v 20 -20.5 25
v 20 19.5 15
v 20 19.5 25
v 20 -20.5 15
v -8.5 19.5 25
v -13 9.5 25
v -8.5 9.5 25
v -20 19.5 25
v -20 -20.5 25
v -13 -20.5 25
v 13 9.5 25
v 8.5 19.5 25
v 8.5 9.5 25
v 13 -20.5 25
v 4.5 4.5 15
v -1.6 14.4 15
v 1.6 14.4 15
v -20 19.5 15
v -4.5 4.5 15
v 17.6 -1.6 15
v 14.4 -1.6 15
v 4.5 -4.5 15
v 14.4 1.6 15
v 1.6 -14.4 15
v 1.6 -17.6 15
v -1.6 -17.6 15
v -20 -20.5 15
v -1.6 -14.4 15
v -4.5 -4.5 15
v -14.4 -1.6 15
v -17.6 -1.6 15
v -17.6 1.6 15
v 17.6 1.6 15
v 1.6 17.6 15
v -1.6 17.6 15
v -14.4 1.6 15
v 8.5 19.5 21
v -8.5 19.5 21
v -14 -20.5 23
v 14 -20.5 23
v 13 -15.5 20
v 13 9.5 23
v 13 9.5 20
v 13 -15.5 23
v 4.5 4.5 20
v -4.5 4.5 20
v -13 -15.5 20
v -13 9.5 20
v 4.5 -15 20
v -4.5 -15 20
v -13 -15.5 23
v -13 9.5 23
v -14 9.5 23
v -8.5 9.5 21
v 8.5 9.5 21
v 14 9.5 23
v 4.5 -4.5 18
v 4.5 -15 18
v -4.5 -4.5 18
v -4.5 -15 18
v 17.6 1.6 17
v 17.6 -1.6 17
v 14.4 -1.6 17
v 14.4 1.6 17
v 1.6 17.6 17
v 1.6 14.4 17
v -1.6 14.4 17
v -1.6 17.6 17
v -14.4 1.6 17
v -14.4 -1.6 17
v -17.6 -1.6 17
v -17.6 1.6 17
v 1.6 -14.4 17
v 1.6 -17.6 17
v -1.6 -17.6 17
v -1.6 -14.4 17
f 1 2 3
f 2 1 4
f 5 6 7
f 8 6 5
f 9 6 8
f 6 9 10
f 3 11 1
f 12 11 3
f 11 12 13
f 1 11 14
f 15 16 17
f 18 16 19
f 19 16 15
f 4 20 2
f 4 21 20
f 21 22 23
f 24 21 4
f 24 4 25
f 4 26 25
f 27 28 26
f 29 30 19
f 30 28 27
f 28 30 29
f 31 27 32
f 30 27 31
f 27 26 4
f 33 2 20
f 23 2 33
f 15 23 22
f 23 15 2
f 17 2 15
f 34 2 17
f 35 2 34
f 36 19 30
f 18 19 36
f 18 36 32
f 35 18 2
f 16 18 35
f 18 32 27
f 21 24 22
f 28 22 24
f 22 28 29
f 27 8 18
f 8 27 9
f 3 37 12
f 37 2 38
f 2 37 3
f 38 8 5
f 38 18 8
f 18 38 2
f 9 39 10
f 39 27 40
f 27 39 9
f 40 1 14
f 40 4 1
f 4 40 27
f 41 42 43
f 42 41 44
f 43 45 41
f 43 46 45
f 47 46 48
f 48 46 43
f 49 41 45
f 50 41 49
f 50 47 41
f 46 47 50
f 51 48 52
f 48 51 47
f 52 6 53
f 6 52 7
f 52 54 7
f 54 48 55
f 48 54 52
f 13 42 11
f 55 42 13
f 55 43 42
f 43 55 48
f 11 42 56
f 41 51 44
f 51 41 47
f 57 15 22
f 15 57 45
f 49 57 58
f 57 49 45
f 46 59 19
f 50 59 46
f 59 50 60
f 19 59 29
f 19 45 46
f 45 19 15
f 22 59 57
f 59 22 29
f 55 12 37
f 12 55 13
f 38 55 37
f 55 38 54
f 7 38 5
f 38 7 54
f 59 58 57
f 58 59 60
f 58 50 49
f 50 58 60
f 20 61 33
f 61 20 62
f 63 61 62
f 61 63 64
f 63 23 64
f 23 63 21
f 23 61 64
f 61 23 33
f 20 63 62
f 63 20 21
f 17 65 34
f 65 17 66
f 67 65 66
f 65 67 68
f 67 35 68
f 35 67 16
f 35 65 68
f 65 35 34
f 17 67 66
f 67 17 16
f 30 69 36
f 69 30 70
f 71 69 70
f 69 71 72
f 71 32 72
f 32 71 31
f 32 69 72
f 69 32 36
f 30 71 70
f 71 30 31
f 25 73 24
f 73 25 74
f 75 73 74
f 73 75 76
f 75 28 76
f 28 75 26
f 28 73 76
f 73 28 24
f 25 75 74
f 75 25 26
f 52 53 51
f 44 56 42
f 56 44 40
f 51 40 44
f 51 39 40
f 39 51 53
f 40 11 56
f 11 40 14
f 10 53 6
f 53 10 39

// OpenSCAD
module piCameraMicroscopeAdapter() 
{
	function r_from_dia(d) = d / 2;
	function midValue(a,b) = ( a + b ) / 2;

	union() {
		piCameraAdapter();
//		piCameraBackCover(0.2);
//		microscopeAdapter();
//		telescopeAdapter();
	}

	module snap(position,clearance) {
		c = clearance;
		translate(position)
			cube(size=[3+c,3+c,2],center=true);
	}

	module snaps(radius,clearance) {
		r = radius;
		z = 16.0;
		union() {
			snap([ r, 0,z],clearance=clearance);
			snap([ 0, r,z],clearance=clearance);
			snap([-r, 0,z],clearance=clearance);
			snap([ 0,-r,z],clearance=clearance);
		}
	}

	module cylindricAdapter(inRadius,exRadius,height) {
		midRadius = midValue(exRadius,inRadius);
		union() {
			translate([0,0,5])
				difference() {
						cylinder(r=exRadius, h=height, center=true);
						cylinder(r=inRadius, h=height, center=true);
				}

				snaps(midRadius,-0.2);
		}
	}

	module piCameraBackCoverBevel(clearance) {
		c = clearance;
		hw = ( 25 / 2 ) + c;
		he = hw + 1.0;
		polyhedron
			(points = [
				[ hw, -15, -1 ],
				[ hw,  15, -1 ], 
				[ hw,  15,  1 ], 
				[ hw, -15,  1 ],
				[ he, -15, -1 ],
				[ he,  15, -1 ] 
				], 
			triangles = [
				[ 0, 1, 4 ],
				[ 1, 5, 4 ],
				[ 0, 4, 3 ],
				[ 1, 2, 5 ],
				[ 2, 3, 4 ],
				[ 2, 4, 5 ],
				[ 0, 2, 1 ],
				[ 0, 3, 2 ]
			]
		);
	}

	module piCameraBackCoverBevels(clearance) {
		union() {
			piCameraBackCoverBevel(clearance);
			mirror([1,0,0])
				piCameraBackCoverBevel(clearance);
		}
	}

	module piCameraBackCover(clearance) {
		c = 2*clearance;
		translate([0,-5.5,24])
			union() {
				piCameraBackCoverBevels(clearance);
				difference() {
					cube(size=[25+c,30,2],center=true);
					translate([0,12,0])
						cube(size=[20,7,2],center=true);
				}
			}
	}

	module microscopeAdapter() {
		clearance = 0.5;
		inDiameter = 28+clearance;
		exDiameter = 36;
		cylindricAdapter(r_from_dia(inDiameter),r_from_dia(exDiameter),height=20);
	}

	module telescopeAdapter() {
		inDiameter = 33.5;
		exDiameter = 40;
		cylindricAdapter(r_from_dia(inDiameter),r_from_dia(exDiameter),height=20);
	}

	module cableOpening() {
		translate([0,14,3])
			cube(size=[17,12,4],center=true);
	}

	module chipOpening() {
		clearance = 0.5;
		c = 2 * clearance;
		translate([0,-9.5,0])
			cube(size=[8+c,10+c,4],center=true);
	}

	module lensOpening() {
		clearance = 0.5;
		c = 2 * clearance;
		translate([0,0,-2.5])
			cube(size=[8+c,8+c,5], center=true);
	}

	module boardOpening() {
		clearance = 0.5;
		c = 2 * clearance;
		translate([0,-3,2.5])
			cube(size=[25+c,24+c,5], center=true);
	}

	module cameraFrame() {
		translate([0,-0.5,0])
			cube(size=[40,40,10], center=true);
	}

	module piCameraAdapter() {
		difference() {
			translate([0,0,20])
				difference() {
					cameraFrame();
					boardOpening();
					lensOpening();
					cableOpening();
					chipOpening();
				}
			snaps(16,0.2);
			piCameraBackCover(0.5);
		}
	}

}

piCameraMicroscopeAdapter();
